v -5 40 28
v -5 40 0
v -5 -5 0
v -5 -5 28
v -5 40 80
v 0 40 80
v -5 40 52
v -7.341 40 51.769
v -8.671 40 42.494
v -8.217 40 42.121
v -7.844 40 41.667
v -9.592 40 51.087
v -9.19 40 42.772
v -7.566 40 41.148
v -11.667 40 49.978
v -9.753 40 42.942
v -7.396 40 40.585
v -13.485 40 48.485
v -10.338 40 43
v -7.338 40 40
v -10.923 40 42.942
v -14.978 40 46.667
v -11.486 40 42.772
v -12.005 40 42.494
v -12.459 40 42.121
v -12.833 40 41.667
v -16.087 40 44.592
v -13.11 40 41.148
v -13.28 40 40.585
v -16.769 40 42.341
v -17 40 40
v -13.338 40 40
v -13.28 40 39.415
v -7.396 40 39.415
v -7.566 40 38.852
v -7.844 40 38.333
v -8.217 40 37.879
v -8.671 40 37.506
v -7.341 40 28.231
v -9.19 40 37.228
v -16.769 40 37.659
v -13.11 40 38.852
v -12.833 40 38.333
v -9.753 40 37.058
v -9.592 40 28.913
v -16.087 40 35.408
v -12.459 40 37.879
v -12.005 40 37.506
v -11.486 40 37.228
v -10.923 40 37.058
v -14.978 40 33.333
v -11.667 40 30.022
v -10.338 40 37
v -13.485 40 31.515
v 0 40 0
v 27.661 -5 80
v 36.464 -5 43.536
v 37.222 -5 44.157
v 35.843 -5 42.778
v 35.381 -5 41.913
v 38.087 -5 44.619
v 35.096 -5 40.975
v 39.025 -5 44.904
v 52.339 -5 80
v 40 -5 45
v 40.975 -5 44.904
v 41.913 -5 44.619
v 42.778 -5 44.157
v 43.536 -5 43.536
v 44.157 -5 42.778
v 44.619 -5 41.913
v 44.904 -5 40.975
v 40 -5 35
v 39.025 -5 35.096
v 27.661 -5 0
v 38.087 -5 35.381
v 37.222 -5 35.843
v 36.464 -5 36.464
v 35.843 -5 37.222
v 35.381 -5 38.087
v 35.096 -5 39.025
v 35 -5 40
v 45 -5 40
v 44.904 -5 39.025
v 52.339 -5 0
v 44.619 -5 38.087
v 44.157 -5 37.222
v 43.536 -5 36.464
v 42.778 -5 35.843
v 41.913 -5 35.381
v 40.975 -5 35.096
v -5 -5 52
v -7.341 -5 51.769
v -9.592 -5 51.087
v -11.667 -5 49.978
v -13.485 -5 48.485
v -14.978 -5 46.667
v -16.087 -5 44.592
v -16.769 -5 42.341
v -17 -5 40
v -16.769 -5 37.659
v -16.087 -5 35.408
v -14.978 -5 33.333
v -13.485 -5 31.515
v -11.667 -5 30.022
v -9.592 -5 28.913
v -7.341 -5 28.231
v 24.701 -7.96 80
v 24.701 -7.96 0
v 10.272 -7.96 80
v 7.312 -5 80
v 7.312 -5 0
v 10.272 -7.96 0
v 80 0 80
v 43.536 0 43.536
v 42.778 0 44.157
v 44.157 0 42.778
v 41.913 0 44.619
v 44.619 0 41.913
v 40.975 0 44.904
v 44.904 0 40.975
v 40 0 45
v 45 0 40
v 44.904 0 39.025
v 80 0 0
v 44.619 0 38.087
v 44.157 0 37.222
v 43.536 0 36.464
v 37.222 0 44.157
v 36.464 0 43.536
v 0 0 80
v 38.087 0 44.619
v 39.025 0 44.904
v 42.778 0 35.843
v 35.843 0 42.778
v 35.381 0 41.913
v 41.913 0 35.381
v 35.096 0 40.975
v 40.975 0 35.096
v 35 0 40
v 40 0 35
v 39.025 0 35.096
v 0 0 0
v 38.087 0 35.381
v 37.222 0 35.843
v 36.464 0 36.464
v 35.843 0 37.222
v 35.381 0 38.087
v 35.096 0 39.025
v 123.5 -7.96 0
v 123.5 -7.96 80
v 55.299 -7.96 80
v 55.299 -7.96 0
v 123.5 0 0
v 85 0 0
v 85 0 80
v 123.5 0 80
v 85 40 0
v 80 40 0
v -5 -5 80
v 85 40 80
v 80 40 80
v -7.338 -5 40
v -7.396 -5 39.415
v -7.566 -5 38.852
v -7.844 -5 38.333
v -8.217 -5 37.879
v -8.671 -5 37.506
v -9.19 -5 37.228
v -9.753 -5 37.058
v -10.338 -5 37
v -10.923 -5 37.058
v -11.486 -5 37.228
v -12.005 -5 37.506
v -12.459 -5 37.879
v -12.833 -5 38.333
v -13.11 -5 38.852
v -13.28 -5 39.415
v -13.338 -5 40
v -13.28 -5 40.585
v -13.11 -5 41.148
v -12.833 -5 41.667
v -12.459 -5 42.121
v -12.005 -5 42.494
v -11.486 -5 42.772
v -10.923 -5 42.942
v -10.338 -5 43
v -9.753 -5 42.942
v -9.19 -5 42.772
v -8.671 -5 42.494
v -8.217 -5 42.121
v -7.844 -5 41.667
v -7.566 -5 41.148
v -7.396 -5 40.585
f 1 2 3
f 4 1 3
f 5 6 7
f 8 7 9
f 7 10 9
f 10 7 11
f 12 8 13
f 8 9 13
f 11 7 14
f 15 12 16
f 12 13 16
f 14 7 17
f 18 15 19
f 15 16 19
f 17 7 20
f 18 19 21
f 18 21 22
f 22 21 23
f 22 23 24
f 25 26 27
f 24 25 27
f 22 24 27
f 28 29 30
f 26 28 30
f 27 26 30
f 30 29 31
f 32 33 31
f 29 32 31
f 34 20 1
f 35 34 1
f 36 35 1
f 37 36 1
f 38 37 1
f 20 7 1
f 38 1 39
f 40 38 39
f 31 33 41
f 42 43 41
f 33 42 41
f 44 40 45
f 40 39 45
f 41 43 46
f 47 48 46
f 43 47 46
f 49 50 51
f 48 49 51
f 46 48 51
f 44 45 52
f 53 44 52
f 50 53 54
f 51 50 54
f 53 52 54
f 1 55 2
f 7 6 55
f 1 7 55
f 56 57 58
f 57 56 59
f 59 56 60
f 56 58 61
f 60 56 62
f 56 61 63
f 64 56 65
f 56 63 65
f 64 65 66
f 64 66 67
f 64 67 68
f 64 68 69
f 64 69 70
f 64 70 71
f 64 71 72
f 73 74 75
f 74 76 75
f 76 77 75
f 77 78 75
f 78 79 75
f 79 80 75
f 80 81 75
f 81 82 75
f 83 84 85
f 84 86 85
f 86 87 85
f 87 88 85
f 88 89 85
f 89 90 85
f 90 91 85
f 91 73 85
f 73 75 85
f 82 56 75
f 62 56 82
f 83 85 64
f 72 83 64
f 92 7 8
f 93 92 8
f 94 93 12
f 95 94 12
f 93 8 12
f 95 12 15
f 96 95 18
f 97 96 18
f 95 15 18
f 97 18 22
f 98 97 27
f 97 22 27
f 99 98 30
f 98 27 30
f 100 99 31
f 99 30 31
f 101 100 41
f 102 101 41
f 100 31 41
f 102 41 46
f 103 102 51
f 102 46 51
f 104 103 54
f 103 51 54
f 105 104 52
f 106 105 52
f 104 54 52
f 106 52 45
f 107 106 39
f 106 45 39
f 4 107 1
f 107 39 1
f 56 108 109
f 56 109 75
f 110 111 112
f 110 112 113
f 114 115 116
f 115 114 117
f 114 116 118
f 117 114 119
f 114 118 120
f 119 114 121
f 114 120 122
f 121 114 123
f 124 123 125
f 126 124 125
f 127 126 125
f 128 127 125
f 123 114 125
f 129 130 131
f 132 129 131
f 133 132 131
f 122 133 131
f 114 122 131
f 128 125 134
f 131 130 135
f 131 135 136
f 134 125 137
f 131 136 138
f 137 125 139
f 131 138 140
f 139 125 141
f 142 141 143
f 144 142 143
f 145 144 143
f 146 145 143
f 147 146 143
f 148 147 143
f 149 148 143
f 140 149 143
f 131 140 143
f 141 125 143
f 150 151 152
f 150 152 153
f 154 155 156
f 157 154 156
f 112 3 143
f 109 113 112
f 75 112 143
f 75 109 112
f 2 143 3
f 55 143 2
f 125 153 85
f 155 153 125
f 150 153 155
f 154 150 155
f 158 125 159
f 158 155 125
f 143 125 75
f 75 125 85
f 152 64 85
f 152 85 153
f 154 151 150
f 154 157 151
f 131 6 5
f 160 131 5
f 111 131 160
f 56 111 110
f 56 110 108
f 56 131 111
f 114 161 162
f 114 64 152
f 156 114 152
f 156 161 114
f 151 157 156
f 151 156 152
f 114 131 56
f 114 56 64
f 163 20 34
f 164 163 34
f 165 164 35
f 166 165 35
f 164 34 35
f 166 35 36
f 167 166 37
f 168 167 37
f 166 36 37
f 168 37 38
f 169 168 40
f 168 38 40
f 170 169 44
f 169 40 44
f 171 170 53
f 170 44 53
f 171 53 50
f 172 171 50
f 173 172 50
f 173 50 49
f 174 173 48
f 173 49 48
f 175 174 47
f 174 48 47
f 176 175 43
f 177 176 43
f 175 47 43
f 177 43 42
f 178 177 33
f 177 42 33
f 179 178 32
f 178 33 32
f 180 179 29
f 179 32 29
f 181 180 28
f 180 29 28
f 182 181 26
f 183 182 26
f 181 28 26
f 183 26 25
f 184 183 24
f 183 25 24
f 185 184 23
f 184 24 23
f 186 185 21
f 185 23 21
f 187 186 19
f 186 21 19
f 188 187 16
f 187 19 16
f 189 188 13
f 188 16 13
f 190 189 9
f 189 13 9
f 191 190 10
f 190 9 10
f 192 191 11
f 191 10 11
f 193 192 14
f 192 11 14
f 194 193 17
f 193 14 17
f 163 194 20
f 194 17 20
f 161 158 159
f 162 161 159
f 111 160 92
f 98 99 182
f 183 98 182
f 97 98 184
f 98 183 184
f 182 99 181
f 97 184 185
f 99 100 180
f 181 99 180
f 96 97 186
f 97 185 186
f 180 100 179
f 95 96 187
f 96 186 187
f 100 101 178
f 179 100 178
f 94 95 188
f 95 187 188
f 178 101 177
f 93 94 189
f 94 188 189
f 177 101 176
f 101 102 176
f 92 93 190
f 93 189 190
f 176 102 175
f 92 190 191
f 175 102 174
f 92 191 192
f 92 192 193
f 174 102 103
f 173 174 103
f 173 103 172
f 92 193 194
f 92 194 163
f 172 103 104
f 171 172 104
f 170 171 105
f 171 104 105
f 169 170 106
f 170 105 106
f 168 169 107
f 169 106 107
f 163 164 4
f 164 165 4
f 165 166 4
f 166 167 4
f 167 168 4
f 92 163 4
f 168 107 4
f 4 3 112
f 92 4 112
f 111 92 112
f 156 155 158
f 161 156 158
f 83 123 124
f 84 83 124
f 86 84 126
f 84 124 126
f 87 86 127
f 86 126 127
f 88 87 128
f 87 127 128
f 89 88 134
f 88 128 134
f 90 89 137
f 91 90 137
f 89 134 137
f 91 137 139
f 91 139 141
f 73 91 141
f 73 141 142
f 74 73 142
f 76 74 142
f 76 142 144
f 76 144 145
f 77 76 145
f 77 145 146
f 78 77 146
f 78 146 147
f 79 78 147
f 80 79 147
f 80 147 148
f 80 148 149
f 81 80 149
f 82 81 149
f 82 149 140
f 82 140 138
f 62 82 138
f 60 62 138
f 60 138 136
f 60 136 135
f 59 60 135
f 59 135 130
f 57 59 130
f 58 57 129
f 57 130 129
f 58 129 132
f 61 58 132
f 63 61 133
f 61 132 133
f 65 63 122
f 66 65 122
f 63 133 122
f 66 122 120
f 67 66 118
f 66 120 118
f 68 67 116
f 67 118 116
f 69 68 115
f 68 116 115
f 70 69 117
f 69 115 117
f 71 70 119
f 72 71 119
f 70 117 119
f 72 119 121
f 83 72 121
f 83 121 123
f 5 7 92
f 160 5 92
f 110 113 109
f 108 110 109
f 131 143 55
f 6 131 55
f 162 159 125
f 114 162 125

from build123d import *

# Parameters (mm, degrees)
BOSS_EXTRUDE2_DEPTH             = 80
SKETCH2_R                       = 3
BOSS_EXTRUDE3_DEPTH             = 45
SKETCH3_R                       = 5
CUT_EXTRUDE1_DEPTH              = 8.959911114
BOSS_EXTRUDE4_DEPTH             = 38.5
BOSS_EXTRUDE4_DIRECTION_2_REACH = 104


with BuildPart() as part:
    # Sketch1 → Boss-Extrude2 (new body)
    with BuildSketch(Plane.XY):
        Polygon((9.382877742, 0), (0, 0), (0, 40), (-5, 40), (-5, -5), (7.31180993, -5), (10.271721045, -7.959911114), (24.701165041, -7.959911114), (27.661076156, -5), (52.338923844, -5), (55.298834959, -7.959911114), (69.728278955, -7.959911114), (72.68819007, -5), (85, -5), (85, 40), (80, 40), (80, 0), (70.617122258, 0), (54.409991656, 0), (25.590008344, 0), align=None)
    extrude(amount=BOSS_EXTRUDE2_DEPTH)

    # Sketch2 → Boss-Extrude3 (add)
    with BuildSketch(Plane(origin=(0, 40, 0), x_dir=(1, 0, 0), z_dir=(0, 1, 0))):
        with BuildLine():
            Line((-5, -28), (-5, -52))
            ThreePointArc((-5, -52), (-17, -40), (-5, -28))
        make_face()
        with Locations((-10.338111961, -40)):
            Circle(SKETCH2_R, mode=Mode.SUBTRACT)
    extrude(amount=-BOSS_EXTRUDE3_DEPTH)

    # Sketch3 → Cut-Extrude1 (cut, through all)
    with BuildSketch(Plane(origin=(0, 0, 0), x_dir=(1, 0, 0), z_dir=(0, 1, 0))):
        with Locations((40, -40)):
            Circle(SKETCH3_R)
    extrude(amount=-CUT_EXTRUDE1_DEPTH, mode=Mode.SUBTRACT)

    # Sketch5 → Boss-Extrude4 (add)
    with BuildSketch(Plane(origin=(85, 0, 0), x_dir=(0, 0, -1), z_dir=(1, 0, 0))):
        Polygon((-80, -5), (-80, -7.959911114), (0, -7.959911114), (0, -5), (0, 0), (-80, 0), align=None)
    extrude(amount=BOSS_EXTRUDE4_DEPTH)

    # Boss-Extrude4 direction 2: up to this face of the body (flat: up to its plane)
    boss_extrude4_direction_2_end = Plane(part.part.faces().sort_by_distance((71.208234512, -6.479955557, 40))[0])
    # Sketch5 → Boss-Extrude4 direction 2 (add, up to the picked face)
    with BuildSketch(Plane(origin=(85, 0, 0), x_dir=(0, 0, -1), z_dir=(1, 0, 0)), mode=Mode.PRIVATE) as boss_extrude4_direction_2_sk1:
        Polygon((-80, -5), (-80, -7.959911114), (0, -7.959911114), (0, -5), (0, 0), (-80, 0), align=None)
    boss_extrude4_direction_2_tool1 = split(extrude(boss_extrude4_direction_2_sk1.sketch, amount=-BOSS_EXTRUDE4_DIRECTION_2_REACH, mode=Mode.PRIVATE), bisect_by=boss_extrude4_direction_2_end, keep=Keep.BOTH, mode=Mode.PRIVATE)
    add(boss_extrude4_direction_2_tool1.solids().sort_by_distance((85, -3.979956, 40))[0])


solid = part.part
